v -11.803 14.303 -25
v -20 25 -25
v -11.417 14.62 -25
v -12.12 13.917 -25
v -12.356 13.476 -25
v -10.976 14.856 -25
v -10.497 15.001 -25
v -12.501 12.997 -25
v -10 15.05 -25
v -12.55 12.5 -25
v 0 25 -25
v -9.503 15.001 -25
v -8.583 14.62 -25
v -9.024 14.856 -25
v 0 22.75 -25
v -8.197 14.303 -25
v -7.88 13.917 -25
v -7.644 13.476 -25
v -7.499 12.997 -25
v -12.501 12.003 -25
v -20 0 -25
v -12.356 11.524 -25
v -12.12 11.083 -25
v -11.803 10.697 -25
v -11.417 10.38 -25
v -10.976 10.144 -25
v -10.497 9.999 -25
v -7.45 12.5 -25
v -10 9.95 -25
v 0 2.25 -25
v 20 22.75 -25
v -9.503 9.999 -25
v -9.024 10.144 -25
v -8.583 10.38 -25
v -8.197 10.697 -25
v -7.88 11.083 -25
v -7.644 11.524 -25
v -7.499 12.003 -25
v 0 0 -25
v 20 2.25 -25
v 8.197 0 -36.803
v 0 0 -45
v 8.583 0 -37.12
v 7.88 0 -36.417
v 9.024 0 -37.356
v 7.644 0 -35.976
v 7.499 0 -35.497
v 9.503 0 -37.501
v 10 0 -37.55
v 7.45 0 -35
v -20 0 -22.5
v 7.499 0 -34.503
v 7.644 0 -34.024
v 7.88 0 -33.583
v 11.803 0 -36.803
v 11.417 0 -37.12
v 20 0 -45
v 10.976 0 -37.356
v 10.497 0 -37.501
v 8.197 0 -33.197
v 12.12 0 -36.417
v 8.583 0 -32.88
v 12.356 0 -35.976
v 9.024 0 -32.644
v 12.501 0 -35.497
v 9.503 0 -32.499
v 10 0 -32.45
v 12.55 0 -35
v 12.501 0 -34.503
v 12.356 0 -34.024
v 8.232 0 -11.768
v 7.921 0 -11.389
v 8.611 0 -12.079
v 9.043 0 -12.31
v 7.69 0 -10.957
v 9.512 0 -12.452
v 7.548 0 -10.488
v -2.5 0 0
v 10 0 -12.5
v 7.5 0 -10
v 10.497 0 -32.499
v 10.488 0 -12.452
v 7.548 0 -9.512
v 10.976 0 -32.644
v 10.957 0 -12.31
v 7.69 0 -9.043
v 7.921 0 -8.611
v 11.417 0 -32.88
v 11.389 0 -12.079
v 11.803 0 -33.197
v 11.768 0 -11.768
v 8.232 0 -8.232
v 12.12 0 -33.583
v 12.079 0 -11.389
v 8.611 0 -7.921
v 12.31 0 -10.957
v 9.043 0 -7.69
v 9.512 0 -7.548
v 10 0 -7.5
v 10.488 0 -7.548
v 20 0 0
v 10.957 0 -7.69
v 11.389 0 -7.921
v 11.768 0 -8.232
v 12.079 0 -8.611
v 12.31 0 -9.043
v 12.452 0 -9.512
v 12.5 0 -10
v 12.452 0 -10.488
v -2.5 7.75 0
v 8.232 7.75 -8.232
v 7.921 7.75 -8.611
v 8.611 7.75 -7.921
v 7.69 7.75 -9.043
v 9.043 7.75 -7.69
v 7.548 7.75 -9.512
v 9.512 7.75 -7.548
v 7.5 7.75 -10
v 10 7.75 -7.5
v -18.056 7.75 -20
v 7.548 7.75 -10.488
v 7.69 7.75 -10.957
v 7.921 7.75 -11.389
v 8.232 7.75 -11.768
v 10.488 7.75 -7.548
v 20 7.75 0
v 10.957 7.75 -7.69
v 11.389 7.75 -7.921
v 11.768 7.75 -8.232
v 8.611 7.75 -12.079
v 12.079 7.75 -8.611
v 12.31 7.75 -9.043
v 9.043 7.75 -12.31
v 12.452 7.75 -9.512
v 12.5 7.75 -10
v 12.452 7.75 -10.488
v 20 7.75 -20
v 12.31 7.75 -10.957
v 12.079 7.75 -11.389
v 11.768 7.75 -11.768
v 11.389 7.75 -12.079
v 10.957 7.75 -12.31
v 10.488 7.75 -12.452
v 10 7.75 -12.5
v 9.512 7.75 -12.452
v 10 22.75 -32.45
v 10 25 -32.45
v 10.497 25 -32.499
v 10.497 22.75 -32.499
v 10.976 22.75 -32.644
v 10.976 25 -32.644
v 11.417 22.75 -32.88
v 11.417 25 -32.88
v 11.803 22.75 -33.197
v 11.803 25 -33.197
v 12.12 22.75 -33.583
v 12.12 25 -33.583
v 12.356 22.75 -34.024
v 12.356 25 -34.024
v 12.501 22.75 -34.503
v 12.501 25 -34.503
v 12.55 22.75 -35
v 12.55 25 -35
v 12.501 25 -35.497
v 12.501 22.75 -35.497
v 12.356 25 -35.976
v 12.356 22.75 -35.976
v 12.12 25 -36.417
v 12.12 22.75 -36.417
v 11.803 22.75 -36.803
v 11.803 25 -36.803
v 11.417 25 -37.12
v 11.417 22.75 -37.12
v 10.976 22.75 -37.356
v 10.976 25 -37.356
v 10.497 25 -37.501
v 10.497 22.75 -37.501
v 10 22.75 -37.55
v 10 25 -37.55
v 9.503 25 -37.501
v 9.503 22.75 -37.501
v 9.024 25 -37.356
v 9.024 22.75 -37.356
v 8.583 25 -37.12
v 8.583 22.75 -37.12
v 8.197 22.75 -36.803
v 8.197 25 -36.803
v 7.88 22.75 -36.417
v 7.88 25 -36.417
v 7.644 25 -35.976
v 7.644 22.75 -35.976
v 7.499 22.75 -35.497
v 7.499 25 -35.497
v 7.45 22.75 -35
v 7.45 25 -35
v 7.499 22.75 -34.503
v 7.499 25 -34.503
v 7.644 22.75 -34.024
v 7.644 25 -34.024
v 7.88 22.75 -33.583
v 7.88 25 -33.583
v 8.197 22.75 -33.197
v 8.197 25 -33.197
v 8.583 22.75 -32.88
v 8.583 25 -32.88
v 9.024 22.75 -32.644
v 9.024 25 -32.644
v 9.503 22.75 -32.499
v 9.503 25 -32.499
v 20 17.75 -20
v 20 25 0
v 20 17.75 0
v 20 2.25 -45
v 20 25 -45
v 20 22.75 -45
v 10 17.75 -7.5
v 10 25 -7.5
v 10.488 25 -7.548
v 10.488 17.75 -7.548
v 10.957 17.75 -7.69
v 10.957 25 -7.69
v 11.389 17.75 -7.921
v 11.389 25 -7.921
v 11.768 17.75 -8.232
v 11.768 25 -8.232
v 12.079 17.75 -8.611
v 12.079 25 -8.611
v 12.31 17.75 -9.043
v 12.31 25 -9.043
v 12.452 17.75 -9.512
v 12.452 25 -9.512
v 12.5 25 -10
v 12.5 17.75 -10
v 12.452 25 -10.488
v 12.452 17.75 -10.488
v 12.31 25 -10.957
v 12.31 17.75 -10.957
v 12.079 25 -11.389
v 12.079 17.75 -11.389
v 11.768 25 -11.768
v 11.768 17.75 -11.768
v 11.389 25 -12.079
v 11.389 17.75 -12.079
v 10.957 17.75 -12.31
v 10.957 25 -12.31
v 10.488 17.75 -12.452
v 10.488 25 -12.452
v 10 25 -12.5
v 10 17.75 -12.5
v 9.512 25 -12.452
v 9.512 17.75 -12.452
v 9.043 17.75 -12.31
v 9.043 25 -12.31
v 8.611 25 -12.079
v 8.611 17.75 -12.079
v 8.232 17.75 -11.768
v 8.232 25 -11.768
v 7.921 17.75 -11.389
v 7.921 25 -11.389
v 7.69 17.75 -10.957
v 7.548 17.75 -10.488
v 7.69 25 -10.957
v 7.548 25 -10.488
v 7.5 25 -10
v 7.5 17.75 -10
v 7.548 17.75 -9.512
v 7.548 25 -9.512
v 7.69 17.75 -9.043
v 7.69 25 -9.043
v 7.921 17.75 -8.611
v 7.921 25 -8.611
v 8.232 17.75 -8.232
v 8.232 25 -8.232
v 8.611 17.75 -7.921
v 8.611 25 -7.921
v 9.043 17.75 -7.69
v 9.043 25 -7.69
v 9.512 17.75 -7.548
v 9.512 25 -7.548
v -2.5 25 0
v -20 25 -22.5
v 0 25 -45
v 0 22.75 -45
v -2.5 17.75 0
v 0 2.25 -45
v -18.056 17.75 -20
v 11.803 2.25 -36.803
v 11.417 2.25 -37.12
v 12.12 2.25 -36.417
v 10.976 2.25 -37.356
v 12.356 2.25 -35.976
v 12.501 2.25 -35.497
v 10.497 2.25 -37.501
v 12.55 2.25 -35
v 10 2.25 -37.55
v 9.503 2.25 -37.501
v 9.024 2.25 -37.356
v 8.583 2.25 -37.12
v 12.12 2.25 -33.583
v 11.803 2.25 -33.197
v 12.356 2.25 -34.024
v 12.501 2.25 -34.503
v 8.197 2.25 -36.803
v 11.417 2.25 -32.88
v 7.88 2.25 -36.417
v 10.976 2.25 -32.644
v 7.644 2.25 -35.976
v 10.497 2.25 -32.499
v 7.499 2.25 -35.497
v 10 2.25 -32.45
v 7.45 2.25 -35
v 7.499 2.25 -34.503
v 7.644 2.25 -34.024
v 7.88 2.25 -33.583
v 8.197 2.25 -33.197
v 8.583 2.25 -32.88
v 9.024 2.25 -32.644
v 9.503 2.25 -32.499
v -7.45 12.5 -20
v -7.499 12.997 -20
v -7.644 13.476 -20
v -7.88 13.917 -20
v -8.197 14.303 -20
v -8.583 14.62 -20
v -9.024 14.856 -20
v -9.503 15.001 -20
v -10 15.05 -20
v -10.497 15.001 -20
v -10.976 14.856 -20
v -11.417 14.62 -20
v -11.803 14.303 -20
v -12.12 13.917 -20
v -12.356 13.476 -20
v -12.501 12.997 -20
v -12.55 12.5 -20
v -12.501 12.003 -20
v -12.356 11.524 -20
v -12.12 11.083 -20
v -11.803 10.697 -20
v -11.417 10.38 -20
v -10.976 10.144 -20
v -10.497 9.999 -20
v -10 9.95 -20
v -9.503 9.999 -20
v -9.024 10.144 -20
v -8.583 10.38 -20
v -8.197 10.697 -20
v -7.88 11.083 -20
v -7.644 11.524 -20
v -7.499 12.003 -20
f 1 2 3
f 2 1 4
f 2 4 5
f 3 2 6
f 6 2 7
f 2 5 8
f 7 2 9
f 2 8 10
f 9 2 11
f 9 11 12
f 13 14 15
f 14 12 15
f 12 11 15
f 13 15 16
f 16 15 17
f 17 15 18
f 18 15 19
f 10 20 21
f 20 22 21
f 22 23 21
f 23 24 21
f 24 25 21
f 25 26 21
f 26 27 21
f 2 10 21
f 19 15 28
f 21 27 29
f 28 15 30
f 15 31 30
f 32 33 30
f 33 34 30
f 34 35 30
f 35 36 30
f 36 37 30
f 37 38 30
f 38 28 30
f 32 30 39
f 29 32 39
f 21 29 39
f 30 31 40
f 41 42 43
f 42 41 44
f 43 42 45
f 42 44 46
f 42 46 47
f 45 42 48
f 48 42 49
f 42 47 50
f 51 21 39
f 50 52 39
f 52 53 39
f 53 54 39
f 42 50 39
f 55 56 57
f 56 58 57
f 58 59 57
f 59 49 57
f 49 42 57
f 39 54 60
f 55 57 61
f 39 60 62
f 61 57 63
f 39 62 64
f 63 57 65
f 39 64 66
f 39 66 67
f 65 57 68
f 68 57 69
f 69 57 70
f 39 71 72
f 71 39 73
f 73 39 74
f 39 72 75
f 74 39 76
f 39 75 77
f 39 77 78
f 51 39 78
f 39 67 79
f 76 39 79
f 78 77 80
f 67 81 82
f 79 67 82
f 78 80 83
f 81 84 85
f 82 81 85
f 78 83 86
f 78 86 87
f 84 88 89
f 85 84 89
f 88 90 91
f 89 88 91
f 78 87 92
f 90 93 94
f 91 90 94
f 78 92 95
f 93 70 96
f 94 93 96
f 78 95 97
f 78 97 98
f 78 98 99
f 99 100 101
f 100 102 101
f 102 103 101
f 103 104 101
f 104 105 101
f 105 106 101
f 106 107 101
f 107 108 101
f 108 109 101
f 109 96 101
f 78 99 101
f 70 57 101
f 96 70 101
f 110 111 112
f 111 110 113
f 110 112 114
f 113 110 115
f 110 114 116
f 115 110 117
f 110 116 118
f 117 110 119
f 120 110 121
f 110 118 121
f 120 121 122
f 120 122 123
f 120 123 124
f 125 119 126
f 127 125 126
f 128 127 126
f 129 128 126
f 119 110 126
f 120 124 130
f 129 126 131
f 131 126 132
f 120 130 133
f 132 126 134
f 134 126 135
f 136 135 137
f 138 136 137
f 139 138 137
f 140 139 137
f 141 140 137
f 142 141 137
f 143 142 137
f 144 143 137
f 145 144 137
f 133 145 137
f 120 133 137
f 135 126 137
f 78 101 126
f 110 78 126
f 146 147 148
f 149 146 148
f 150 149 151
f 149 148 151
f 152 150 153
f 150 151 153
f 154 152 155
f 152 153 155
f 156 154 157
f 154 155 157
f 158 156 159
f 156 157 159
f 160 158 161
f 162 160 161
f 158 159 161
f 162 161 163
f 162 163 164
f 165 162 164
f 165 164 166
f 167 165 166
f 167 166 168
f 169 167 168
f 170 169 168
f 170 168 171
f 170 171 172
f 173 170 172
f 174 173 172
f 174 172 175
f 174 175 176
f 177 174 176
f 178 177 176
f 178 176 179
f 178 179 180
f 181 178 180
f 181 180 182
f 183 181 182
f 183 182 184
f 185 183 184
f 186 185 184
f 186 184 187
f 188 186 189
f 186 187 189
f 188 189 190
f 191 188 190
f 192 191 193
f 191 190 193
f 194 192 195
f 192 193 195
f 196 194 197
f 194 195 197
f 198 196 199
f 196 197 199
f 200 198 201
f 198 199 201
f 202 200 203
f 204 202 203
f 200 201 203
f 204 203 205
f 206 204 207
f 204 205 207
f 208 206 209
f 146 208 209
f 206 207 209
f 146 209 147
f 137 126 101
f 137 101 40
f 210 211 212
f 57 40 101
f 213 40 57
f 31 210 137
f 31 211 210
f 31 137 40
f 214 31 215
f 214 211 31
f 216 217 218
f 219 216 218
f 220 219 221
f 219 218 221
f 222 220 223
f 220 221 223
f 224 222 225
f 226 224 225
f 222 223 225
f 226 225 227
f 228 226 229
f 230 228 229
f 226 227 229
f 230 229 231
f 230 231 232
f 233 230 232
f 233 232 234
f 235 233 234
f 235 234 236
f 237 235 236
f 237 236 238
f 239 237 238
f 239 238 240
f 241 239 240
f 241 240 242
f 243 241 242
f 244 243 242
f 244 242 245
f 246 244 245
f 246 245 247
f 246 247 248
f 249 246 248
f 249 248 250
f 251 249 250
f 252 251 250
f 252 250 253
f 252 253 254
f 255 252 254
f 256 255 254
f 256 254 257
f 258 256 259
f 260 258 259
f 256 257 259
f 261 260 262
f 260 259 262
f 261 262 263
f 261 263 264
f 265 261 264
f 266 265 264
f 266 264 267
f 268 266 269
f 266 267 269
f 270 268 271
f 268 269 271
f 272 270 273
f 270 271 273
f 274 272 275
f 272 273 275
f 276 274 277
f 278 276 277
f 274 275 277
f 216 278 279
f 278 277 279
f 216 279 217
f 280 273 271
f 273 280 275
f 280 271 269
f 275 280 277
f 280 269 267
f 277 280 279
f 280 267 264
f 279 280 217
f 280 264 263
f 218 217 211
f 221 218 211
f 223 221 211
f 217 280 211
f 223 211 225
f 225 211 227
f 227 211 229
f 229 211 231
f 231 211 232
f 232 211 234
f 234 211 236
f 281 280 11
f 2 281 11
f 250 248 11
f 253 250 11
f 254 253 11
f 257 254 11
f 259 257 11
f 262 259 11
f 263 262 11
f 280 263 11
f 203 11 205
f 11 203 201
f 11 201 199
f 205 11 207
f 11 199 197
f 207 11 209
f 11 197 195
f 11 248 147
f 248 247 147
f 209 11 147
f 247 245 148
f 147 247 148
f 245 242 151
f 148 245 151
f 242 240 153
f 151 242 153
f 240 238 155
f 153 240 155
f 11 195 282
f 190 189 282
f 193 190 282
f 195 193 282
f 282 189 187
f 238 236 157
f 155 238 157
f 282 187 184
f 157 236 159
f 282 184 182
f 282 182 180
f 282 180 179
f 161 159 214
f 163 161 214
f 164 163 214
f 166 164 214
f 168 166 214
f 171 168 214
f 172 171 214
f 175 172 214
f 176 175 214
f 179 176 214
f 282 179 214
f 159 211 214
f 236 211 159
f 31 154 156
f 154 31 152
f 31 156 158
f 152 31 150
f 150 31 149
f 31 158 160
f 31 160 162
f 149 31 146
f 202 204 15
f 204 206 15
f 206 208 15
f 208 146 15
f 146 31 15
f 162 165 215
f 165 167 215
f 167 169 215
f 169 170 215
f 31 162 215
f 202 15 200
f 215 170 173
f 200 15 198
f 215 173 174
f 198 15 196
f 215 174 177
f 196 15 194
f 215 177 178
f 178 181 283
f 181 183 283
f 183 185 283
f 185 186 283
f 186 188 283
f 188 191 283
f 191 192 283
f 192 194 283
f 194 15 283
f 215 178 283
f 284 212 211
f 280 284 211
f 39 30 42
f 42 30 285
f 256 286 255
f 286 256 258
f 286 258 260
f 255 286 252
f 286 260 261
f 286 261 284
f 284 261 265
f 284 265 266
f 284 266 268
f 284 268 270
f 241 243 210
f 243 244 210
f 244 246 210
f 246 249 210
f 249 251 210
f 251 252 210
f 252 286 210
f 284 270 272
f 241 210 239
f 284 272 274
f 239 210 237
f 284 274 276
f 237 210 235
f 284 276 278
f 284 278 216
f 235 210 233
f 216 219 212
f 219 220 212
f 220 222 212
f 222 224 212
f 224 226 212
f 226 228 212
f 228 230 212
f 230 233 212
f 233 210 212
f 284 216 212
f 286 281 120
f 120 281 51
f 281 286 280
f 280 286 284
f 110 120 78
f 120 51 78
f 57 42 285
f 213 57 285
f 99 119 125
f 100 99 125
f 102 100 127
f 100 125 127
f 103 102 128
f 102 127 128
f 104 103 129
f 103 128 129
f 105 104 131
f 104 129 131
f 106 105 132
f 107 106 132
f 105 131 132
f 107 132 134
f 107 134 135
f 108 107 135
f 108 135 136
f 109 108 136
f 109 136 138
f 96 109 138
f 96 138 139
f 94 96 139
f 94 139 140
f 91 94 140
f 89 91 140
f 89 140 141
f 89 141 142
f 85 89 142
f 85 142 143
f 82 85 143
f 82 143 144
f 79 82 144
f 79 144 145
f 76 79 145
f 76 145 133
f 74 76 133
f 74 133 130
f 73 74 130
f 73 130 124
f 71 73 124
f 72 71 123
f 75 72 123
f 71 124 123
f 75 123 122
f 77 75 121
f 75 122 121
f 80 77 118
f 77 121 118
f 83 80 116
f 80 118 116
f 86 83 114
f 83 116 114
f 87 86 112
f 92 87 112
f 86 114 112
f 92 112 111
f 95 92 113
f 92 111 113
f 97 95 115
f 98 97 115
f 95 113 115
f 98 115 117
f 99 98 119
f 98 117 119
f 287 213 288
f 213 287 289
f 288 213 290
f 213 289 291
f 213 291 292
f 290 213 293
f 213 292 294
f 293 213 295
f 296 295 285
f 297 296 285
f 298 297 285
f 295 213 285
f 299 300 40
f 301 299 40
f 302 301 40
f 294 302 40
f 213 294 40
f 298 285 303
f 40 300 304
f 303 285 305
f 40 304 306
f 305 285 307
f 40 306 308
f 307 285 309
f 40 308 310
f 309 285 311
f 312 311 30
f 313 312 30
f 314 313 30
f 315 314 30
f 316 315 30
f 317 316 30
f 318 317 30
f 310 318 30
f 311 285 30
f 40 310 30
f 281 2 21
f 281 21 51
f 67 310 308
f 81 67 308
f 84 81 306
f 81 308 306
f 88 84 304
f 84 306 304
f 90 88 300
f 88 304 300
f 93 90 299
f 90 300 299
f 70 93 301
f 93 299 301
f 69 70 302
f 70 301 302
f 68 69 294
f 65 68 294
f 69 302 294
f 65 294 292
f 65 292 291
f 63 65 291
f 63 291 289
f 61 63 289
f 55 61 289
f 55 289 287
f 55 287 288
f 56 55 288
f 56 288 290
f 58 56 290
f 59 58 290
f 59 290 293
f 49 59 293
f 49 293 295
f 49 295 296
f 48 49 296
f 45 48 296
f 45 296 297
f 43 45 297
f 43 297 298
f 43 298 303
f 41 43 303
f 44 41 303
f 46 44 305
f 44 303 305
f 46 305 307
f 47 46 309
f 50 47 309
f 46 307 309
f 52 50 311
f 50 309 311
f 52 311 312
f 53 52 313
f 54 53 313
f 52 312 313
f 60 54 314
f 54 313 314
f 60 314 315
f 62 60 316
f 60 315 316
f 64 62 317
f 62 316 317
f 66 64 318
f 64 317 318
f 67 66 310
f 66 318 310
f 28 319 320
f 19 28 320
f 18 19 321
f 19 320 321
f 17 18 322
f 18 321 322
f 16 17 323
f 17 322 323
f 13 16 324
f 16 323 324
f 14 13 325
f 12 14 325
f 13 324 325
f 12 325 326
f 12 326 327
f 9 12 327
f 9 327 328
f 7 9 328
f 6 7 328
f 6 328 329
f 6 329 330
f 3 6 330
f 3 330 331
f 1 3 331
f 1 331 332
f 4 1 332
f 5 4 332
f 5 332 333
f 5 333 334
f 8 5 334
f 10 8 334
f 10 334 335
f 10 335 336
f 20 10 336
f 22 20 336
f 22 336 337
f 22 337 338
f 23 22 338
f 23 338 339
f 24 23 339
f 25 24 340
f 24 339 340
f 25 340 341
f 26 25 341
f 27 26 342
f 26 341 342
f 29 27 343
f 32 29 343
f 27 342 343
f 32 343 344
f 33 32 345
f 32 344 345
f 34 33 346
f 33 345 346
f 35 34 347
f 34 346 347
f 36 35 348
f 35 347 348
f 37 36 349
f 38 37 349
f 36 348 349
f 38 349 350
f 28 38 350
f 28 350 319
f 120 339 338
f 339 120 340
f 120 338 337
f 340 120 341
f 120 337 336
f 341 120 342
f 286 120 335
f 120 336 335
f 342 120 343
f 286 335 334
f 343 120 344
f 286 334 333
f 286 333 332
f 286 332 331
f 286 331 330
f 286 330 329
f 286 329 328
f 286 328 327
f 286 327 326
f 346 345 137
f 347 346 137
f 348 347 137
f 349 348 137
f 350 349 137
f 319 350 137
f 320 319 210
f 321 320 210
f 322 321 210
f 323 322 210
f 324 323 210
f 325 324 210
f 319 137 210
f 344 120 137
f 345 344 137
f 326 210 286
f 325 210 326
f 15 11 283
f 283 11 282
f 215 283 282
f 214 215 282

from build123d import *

# Parameters (mm, degrees)
SKETCH2_W           = 20
SKETCH2_H           = 5
SKETCH2_H_2         = 5.5
BOSS_EXTRUDE1_DEPTH = 20
SKETCH3_R           = 2.5
SKETCH3_R_2         = 2.55
CUT_EXTRUDE1_DEPTH  = 56.226805086
BOSS_EXTRUDE2_DEPTH = 20
CUT_EXTRUDE2_DEPTH  = 56.226805086
SKETCH7_R           = 2.55
CUT_EXTRUDE3_DEPTH  = 20


with BuildPart() as part:
    # Sketch2 → Boss-Extrude1 (new body)
    with BuildSketch(Plane(origin=(0, 0, 0), x_dir=(0, 0, -1), z_dir=(1, 0, 0))):
        Polygon((20, 7.75), (20, 2.25), (25, 2.25), (25, 22.75), (20, 22.75), (20, 17.75), align=None)
        Polygon((25, 22.75), (45, 22.75), (45, 25), (0, 25), (0, 22.75), (20, 22.75), align=None)
        Polygon((0, 2.25), (0, 0), (45, 0), (45, 2.25), (25, 2.25), (20, 2.25), align=None)
        with Locations((10, 20.25)):
            Rectangle(SKETCH2_W, SKETCH2_H)
        with Locations((10, 5)):
            Rectangle(SKETCH2_W, SKETCH2_H_2)
    extrude(amount=BOSS_EXTRUDE1_DEPTH)

    # Sketch3 → Cut-Extrude1 (cut, through all)
    with BuildSketch(Plane(origin=(0, 25, 0), x_dir=(1, 0, 0), z_dir=(0, 1, 0))):
        with Locations(Location((10, 10, 0), (0, 0, 270))):
            Circle(SKETCH3_R)
        with Locations(Location((10, 35, 0), (0, 0, 270))):
            Circle(SKETCH3_R_2)
    extrude(amount=-CUT_EXTRUDE1_DEPTH, mode=Mode.SUBTRACT)

    # Sketch5 → Boss-Extrude2 (add)
    with BuildSketch(Plane.ZY):
        Polygon((-25, 25), (-25, 22.75), (-25, 2.25), (-25, 0), (0, 0), (0, 7.75), (-20, 7.75), (-20, 17.75), (0, 17.75), (0, 25), align=None)
    extrude(amount=BOSS_EXTRUDE2_DEPTH)

    # Sketch6 → Cut-Extrude2 (cut, through all)
    with BuildSketch(Plane.XZ):
        Polygon((-20, -22.5), (-2.5, 0), (-20, 0), align=None)
    extrude(amount=-CUT_EXTRUDE2_DEPTH, mode=Mode.SUBTRACT)

    # Sketch7 → Cut-Extrude3 (cut)
    with BuildSketch(Plane.XY.offset(-20)):
        with Locations((-10, 12.5)):
            Circle(SKETCH7_R)
    extrude(amount=-CUT_EXTRUDE3_DEPTH, mode=Mode.SUBTRACT)


solid = part.part
